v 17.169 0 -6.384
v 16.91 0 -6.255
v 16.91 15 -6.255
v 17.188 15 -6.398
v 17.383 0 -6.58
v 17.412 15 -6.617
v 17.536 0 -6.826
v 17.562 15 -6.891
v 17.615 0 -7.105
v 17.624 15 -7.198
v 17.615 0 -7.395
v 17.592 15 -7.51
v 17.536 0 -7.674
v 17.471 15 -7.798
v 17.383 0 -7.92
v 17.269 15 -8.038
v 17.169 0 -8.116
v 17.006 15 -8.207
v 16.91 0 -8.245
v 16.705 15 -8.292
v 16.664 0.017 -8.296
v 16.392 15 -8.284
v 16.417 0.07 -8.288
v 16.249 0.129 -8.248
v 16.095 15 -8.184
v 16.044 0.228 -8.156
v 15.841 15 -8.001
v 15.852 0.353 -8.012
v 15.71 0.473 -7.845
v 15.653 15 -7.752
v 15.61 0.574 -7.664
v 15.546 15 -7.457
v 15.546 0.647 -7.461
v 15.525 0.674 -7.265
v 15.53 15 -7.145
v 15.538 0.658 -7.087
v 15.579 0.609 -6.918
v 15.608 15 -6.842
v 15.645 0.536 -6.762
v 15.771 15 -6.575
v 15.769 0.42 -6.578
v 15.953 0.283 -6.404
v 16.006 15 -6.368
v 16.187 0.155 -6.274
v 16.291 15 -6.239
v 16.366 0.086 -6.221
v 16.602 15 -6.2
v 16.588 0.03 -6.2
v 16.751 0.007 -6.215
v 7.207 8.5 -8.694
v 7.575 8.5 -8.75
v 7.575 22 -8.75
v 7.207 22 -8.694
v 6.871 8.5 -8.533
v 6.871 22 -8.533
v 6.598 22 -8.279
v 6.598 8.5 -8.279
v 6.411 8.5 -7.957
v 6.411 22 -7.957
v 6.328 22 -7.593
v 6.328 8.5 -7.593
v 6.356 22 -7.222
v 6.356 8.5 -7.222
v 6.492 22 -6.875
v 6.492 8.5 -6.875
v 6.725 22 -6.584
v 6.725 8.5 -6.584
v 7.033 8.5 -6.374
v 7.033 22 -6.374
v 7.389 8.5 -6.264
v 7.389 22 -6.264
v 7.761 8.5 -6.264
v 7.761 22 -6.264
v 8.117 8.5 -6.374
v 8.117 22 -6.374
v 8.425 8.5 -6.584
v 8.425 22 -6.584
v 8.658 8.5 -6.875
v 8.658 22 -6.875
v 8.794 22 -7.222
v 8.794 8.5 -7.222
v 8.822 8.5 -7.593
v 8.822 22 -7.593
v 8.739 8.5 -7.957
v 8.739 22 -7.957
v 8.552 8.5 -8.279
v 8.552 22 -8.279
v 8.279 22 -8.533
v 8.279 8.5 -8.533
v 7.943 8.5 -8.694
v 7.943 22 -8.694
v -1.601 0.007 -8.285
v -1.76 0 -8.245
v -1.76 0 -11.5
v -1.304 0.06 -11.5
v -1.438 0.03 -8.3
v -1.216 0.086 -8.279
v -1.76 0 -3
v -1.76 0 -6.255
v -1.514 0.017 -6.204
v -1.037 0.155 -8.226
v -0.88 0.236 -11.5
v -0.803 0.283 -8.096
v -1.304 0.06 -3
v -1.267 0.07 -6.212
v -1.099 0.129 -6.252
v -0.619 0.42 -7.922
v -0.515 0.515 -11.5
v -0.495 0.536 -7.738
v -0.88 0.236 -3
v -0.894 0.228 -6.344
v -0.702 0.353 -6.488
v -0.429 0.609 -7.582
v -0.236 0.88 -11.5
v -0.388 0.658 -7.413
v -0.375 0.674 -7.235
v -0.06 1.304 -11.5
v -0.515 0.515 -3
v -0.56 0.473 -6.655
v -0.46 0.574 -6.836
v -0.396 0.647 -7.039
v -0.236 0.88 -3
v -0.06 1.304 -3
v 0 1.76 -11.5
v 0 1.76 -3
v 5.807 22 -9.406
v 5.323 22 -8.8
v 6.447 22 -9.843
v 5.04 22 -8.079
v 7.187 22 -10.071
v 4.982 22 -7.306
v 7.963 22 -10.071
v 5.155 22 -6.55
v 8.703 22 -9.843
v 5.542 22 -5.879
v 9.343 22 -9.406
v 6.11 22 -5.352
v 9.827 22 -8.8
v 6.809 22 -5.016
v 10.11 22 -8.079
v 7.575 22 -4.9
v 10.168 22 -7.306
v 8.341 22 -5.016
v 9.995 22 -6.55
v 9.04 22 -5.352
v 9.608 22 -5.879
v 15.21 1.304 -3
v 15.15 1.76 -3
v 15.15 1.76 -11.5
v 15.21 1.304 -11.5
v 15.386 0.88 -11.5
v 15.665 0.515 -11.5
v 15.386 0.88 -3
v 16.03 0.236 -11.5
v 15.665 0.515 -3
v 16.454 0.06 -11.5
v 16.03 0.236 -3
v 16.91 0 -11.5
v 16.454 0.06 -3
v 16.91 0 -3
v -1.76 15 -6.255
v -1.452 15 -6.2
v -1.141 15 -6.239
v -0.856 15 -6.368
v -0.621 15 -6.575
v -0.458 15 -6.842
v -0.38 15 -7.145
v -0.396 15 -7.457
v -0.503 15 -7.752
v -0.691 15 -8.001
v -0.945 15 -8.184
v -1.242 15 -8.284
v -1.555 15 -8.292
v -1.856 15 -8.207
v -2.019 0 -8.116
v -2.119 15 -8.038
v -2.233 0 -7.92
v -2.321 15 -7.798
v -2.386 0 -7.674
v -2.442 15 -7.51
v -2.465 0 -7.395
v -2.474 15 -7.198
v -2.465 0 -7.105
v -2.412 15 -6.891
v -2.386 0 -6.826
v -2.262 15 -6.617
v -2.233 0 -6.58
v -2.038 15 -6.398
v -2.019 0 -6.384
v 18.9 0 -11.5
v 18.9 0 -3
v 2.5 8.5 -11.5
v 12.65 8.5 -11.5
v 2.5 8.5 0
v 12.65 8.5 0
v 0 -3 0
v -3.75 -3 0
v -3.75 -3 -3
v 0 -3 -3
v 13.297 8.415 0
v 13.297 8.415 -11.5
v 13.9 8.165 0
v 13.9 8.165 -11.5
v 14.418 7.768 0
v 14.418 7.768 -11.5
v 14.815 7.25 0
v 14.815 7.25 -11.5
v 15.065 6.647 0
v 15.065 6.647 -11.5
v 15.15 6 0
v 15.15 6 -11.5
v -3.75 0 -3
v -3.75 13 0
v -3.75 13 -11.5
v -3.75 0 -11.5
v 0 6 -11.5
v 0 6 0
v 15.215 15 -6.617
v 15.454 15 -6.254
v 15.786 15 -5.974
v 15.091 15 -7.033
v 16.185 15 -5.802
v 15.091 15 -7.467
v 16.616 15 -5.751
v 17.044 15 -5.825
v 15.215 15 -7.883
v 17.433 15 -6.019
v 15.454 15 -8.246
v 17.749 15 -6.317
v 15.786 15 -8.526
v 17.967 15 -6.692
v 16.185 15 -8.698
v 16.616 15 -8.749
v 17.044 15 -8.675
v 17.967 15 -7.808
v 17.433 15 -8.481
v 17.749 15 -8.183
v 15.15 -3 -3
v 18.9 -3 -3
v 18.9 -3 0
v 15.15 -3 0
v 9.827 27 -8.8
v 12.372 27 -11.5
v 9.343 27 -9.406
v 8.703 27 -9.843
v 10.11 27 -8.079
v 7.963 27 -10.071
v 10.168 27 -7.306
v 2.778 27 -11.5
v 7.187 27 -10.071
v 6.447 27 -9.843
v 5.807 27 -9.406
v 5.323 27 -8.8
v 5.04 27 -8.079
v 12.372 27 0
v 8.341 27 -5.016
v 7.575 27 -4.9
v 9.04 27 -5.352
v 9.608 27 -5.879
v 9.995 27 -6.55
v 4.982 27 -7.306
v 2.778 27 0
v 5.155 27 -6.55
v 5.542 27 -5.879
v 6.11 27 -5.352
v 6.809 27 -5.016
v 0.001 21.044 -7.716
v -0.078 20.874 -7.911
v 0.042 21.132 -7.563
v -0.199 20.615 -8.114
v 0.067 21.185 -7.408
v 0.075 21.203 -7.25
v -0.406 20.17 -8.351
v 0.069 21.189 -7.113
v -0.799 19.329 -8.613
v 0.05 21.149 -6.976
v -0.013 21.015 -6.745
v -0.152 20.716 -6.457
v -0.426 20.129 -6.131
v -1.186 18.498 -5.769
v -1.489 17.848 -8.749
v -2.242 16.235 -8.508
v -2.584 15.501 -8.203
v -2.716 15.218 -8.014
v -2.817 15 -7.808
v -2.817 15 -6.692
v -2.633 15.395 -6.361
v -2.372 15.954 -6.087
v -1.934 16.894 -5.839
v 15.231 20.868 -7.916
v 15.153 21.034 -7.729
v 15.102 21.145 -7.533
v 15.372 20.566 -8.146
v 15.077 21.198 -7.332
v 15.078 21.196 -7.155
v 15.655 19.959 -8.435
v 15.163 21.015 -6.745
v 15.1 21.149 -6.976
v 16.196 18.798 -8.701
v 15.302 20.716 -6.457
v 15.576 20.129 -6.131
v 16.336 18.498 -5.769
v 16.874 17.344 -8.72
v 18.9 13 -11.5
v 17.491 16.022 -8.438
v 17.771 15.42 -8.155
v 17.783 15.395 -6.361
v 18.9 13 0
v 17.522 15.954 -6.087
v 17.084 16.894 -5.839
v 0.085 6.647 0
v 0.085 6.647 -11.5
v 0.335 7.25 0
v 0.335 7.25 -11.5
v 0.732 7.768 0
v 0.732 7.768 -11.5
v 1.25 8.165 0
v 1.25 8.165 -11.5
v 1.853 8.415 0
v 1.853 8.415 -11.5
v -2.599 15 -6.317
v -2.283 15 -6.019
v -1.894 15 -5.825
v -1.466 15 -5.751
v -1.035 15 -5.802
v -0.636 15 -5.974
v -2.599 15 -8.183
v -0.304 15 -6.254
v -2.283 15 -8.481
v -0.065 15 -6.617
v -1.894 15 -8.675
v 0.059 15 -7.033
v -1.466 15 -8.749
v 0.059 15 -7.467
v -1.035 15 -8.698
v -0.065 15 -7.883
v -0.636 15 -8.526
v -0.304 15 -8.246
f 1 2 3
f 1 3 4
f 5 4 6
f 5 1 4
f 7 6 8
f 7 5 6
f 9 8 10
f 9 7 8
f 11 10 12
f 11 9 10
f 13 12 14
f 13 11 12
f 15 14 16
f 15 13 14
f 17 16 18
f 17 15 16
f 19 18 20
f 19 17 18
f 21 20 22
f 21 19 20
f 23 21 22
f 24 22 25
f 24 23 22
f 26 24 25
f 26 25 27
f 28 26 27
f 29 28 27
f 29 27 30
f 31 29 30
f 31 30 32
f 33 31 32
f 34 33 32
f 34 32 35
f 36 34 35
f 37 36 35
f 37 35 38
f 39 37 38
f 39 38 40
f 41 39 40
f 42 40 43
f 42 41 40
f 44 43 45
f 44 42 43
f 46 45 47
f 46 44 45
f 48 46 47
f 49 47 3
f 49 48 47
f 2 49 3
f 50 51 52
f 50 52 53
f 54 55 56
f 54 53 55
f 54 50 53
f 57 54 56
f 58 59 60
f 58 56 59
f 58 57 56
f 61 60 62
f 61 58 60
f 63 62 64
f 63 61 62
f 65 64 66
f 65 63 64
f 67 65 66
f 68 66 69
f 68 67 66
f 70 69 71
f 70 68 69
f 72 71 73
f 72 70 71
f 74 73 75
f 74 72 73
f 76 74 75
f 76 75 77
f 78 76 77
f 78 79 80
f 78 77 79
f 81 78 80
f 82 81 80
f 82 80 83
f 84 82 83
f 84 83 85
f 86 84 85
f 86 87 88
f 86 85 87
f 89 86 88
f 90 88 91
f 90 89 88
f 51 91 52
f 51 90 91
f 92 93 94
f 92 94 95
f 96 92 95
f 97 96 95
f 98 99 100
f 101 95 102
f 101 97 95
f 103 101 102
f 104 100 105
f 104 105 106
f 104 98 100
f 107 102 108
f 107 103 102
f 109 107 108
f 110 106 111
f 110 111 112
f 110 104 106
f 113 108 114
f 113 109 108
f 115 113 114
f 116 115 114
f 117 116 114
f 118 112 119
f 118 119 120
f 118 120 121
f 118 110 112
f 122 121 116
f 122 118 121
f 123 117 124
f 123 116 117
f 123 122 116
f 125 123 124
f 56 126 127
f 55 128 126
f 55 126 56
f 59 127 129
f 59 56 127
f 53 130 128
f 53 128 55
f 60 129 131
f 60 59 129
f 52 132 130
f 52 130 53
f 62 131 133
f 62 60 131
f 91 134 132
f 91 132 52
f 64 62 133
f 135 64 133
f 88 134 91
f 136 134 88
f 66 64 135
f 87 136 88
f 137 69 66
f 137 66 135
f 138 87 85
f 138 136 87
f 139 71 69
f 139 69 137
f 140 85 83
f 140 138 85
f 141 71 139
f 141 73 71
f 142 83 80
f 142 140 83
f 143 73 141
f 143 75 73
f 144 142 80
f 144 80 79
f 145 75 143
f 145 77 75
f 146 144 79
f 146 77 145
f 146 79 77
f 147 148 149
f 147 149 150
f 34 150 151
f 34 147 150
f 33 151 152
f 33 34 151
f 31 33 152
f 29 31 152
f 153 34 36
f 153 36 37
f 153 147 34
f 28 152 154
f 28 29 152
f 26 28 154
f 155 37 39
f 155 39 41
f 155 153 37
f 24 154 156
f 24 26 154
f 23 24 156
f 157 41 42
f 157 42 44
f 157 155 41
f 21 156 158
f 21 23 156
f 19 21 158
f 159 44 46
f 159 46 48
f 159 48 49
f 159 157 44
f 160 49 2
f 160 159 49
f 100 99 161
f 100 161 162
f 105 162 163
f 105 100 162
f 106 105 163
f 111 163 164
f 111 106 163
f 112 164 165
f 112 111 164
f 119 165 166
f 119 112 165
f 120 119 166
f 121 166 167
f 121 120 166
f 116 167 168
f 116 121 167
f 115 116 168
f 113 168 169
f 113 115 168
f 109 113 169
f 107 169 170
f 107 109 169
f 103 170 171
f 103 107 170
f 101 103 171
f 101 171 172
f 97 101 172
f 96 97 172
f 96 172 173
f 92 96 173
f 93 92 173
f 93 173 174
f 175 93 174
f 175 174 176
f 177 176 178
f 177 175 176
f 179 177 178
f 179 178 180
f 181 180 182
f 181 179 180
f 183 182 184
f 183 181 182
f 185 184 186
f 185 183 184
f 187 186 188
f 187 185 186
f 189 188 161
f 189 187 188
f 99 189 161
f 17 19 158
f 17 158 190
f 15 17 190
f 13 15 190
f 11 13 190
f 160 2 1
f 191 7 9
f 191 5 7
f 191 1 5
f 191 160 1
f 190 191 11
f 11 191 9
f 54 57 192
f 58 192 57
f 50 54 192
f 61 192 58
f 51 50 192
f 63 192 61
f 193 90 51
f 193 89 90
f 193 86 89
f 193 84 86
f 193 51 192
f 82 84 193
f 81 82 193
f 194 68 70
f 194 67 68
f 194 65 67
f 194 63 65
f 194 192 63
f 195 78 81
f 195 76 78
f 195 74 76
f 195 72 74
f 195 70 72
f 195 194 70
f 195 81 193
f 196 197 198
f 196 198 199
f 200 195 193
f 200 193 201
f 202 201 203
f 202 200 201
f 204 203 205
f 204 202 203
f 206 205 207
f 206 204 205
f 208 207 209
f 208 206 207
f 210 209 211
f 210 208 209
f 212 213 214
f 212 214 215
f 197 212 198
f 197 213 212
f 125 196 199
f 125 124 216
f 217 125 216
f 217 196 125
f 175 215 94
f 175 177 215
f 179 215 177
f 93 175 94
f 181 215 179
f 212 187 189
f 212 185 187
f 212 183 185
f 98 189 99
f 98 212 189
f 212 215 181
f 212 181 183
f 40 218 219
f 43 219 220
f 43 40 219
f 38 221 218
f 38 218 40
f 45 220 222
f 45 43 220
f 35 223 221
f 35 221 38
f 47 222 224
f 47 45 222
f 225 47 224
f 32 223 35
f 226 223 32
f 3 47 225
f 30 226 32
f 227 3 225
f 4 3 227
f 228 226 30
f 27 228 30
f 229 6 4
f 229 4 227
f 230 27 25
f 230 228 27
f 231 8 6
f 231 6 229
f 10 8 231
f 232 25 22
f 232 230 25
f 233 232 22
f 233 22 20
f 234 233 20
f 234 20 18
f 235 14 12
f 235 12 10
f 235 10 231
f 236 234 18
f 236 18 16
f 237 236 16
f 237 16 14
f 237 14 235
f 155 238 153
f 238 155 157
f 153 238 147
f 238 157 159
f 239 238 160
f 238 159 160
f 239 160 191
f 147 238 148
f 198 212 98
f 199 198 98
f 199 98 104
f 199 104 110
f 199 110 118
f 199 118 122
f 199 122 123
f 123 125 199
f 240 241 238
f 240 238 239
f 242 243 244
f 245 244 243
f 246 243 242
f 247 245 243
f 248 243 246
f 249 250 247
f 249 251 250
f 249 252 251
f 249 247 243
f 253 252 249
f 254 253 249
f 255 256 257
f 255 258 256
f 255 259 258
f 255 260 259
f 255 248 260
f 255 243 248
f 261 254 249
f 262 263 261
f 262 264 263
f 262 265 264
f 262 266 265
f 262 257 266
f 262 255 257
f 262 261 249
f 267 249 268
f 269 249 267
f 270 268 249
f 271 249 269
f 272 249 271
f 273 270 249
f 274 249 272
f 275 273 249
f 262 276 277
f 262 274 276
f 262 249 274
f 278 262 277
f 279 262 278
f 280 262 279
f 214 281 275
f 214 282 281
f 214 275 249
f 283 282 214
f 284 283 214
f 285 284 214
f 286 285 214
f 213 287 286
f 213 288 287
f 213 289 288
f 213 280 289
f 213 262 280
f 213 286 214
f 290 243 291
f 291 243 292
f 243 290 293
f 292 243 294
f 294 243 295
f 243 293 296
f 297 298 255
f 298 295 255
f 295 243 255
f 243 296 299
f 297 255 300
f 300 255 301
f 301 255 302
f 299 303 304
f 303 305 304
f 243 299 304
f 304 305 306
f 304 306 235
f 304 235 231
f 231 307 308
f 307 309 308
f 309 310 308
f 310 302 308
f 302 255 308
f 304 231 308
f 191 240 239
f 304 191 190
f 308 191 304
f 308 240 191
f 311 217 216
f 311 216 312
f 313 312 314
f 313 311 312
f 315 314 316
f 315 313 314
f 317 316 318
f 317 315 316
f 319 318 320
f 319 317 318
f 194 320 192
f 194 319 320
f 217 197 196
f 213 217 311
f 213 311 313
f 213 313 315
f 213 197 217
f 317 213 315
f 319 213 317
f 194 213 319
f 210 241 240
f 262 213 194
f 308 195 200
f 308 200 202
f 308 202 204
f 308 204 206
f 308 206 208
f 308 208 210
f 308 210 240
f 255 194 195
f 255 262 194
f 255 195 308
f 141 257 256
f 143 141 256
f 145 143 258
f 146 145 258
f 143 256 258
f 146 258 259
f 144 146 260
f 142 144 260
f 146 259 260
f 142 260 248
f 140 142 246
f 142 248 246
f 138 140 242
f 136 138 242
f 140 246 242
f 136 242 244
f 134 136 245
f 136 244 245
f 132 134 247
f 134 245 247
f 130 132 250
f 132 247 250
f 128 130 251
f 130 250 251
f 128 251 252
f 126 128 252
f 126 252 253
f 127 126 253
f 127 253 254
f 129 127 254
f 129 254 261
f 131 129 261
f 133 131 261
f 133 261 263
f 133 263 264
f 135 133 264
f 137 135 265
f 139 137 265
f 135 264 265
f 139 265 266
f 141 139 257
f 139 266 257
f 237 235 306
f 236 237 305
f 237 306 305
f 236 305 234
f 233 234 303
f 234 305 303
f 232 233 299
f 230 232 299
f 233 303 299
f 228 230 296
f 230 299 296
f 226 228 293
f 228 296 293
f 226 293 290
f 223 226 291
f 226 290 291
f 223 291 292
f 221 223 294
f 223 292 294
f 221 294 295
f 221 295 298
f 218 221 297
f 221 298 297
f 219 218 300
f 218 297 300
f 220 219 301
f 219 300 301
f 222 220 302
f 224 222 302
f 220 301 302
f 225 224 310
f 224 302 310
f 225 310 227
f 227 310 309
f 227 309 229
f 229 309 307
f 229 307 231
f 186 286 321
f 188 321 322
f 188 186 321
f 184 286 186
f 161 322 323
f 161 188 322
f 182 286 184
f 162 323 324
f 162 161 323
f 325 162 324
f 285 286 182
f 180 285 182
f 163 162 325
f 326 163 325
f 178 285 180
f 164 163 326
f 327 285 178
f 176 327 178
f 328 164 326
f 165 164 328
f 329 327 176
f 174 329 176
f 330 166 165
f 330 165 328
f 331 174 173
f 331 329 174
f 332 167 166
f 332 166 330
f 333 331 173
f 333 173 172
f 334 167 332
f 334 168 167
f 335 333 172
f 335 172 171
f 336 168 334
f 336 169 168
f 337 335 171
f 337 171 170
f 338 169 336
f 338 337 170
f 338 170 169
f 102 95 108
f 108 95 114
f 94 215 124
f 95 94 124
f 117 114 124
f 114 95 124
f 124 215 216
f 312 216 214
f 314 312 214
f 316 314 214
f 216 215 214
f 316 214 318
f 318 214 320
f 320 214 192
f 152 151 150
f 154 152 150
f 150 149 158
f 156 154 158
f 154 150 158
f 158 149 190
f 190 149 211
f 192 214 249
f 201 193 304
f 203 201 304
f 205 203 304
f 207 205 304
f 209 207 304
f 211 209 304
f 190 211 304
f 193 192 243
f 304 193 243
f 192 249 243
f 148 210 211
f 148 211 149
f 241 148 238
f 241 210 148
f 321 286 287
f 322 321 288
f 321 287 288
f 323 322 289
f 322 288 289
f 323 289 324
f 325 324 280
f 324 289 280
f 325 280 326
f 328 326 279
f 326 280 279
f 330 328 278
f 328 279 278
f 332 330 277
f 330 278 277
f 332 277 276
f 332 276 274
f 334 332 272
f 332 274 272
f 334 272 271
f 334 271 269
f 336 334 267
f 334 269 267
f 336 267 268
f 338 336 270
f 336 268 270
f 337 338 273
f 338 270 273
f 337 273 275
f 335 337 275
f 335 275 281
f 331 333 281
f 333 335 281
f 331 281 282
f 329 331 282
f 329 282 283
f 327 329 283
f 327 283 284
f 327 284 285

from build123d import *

# Parameters (mm, degrees)
BOSS_EXTRUDE1_DEPTH      = 11.5
CUT_EXTRUDE1_DEPTH       = 35.906446396
CUT_EXTRUDE1_DEPTH_BACK  = 35.906446396
SKETCH3_R                = 1.05
BOSS_EXTRUDE2_DEPTH      = 3
BOSS_EXTRUDE2_DEPTH_BACK = 11.5
SKETCH4_W                = 3.75
SKETCH4_H                = 3
CUT_EXTRUDE2_DEPTH       = 38.275461128
CUT_EXTRUDE2_DEPTH_BACK  = 38.275461128
SKETCH5_R                = 1.25
CHAMFER1_SIZE            = 6.528307214
CHAMFER1_SIZE_2          = 14
CHAMFER2_SIZE            = 6.528307214
CHAMFER2_SIZE_2          = 14
SKETCH6_R                = 2.6
CUT_EXTRUDE3_DEPTH       = 5
SKETCH7_R                = 1.5
CUT_EXTRUDE4_DEPTH       = 12


with BuildPart() as part:
    # Sketch1 → Boss-Extrude1 (new body)
    with BuildSketch(Plane.XY):
        with BuildLine():
            Line((16.91, 0), (18.9, 0))
            Line((18.9, 0), (18.9, 27))
            Line((18.9, 27), (-3.75, 27))
            Line((-3.75, 27), (-3.75, 0))
            Line((-3.75, 0), (-1.76, 0))
            ThreePointArc((-1.76, 0), (-0.515492065, 0.515492065), (0, 1.76))
            Line((0, 1.76), (0, 6))
            ThreePointArc((0, 6), (0.732233047, 7.767766953), (2.5, 8.5))
            Line((2.5, 8.5), (12.65, 8.5))
            ThreePointArc((12.65, 8.5), (14.417766953, 7.767766953), (15.15, 6))
            Line((15.15, 6), (15.15, 1.76))
            ThreePointArc((15.15, 1.76), (15.665492065, 0.515492065), (16.91, 0))
        make_face()
    extrude(amount=-BOSS_EXTRUDE1_DEPTH)

    # Sketch3 → Cut-Extrude1 (cut, two sides: drawn at the far end of the back side and taken through both)
    with BuildSketch(Plane(origin=(0, 27, 0), x_dir=(1, 0, 0), z_dir=(0, 1, 0)).offset(-CUT_EXTRUDE1_DEPTH_BACK)):
        with Locations(Location((-1.425, 7.25, 0), (0, 0, 251.394661296))):
            Circle(SKETCH3_R)
        with Locations(Location((16.575, 7.25, 0), (0, 0, 288.605338704))):
            Circle(SKETCH3_R)
    extrude(amount=CUT_EXTRUDE1_DEPTH + CUT_EXTRUDE1_DEPTH_BACK, mode=Mode.SUBTRACT)

    # Sketch4 → Boss-Extrude2 (add, two sides: drawn at the far end of the back side and taken through both)
    with BuildSketch(Plane.XZ.offset(-BOSS_EXTRUDE2_DEPTH_BACK)):
        with Locations((17.025, -1.5)):
            Rectangle(SKETCH4_W, SKETCH4_H)
        with Locations((-1.875, -1.5)):
            Rectangle(SKETCH4_W, SKETCH4_H)
    extrude(amount=BOSS_EXTRUDE2_DEPTH + BOSS_EXTRUDE2_DEPTH_BACK)

    # Sketch5 → Cut-Extrude2 (cut, two sides: drawn at the far end of the back side and taken through both)
    with BuildSketch(Plane(origin=(0, 27, 0), x_dir=(1, 0, 0), z_dir=(0, 1, 0)).offset(-CUT_EXTRUDE2_DEPTH_BACK)):
        with Locations(Location((7.575, 7.5, 0), (0, 0, 90))):
            Circle(SKETCH5_R)
    extrude(amount=CUT_EXTRUDE2_DEPTH + CUT_EXTRUDE2_DEPTH_BACK, mode=Mode.SUBTRACT)

    # Chamfer1
    # the kernel refuses this chamfer: 14, 6.528307214 mm, written as the material it takes off along each edge
    with BuildSketch(Plane(origin=(-3.75, 27, 36.2736566), x_dir=(0.9971975577536776, 0.07481330637059945, 0), z_dir=(0, 0, -1))) as chamfer1_piece_1:
        Polygon((CHAMFER1_SIZE * 0.99719755778, CHAMFER1_SIZE * 0.0748133063725), (-CHAMFER1_SIZE_2 * 0.0748133063706, CHAMFER1_SIZE_2 * 0.997197557754), (0, 0), align=None)
    extrude(amount=84.0473132, mode=Mode.SUBTRACT)

    # Chamfer2
    # the kernel refuses this chamfer: 14, 6.528307214 mm, written as the material it takes off along each edge
    with BuildSketch(Plane(origin=(18.9, 27, 36.2736566), x_dir=(-0.9971975577536776, 0.07481330637059945, 0), z_dir=(0, 0, -1))) as chamfer2_piece_1:
        Polygon((CHAMFER2_SIZE * 0.99719755778, -CHAMFER2_SIZE * 0.0748133063725), (-CHAMFER2_SIZE_2 * 0.0748133063706, -CHAMFER2_SIZE_2 * 0.997197557754), (0, 0), align=None)
    extrude(amount=84.0473132, mode=Mode.SUBTRACT)

    # Sketch6 → Cut-Extrude3 (cut)
    with BuildSketch(Plane(origin=(0, 27, 0), x_dir=(1, 0, 0), z_dir=(0, 1, 0))):
        with Locations(Location((7.575, 7.5, 0), (0, 0, 270))):
            Circle(SKETCH6_R)
    extrude(amount=-CUT_EXTRUDE3_DEPTH, mode=Mode.SUBTRACT)

    # Sketch7 → Cut-Extrude4 (cut)
    with BuildSketch(Plane(origin=(0, 27, 0), x_dir=(1, 0, 0), z_dir=(0, 1, 0))):
        with Locations((-1.425, 7.25)):
            Circle(SKETCH7_R)
        with Locations((16.575, 7.25)):
            Circle(SKETCH7_R)
    extrude(amount=-CUT_EXTRUDE4_DEPTH, mode=Mode.SUBTRACT)


solid = part.part
